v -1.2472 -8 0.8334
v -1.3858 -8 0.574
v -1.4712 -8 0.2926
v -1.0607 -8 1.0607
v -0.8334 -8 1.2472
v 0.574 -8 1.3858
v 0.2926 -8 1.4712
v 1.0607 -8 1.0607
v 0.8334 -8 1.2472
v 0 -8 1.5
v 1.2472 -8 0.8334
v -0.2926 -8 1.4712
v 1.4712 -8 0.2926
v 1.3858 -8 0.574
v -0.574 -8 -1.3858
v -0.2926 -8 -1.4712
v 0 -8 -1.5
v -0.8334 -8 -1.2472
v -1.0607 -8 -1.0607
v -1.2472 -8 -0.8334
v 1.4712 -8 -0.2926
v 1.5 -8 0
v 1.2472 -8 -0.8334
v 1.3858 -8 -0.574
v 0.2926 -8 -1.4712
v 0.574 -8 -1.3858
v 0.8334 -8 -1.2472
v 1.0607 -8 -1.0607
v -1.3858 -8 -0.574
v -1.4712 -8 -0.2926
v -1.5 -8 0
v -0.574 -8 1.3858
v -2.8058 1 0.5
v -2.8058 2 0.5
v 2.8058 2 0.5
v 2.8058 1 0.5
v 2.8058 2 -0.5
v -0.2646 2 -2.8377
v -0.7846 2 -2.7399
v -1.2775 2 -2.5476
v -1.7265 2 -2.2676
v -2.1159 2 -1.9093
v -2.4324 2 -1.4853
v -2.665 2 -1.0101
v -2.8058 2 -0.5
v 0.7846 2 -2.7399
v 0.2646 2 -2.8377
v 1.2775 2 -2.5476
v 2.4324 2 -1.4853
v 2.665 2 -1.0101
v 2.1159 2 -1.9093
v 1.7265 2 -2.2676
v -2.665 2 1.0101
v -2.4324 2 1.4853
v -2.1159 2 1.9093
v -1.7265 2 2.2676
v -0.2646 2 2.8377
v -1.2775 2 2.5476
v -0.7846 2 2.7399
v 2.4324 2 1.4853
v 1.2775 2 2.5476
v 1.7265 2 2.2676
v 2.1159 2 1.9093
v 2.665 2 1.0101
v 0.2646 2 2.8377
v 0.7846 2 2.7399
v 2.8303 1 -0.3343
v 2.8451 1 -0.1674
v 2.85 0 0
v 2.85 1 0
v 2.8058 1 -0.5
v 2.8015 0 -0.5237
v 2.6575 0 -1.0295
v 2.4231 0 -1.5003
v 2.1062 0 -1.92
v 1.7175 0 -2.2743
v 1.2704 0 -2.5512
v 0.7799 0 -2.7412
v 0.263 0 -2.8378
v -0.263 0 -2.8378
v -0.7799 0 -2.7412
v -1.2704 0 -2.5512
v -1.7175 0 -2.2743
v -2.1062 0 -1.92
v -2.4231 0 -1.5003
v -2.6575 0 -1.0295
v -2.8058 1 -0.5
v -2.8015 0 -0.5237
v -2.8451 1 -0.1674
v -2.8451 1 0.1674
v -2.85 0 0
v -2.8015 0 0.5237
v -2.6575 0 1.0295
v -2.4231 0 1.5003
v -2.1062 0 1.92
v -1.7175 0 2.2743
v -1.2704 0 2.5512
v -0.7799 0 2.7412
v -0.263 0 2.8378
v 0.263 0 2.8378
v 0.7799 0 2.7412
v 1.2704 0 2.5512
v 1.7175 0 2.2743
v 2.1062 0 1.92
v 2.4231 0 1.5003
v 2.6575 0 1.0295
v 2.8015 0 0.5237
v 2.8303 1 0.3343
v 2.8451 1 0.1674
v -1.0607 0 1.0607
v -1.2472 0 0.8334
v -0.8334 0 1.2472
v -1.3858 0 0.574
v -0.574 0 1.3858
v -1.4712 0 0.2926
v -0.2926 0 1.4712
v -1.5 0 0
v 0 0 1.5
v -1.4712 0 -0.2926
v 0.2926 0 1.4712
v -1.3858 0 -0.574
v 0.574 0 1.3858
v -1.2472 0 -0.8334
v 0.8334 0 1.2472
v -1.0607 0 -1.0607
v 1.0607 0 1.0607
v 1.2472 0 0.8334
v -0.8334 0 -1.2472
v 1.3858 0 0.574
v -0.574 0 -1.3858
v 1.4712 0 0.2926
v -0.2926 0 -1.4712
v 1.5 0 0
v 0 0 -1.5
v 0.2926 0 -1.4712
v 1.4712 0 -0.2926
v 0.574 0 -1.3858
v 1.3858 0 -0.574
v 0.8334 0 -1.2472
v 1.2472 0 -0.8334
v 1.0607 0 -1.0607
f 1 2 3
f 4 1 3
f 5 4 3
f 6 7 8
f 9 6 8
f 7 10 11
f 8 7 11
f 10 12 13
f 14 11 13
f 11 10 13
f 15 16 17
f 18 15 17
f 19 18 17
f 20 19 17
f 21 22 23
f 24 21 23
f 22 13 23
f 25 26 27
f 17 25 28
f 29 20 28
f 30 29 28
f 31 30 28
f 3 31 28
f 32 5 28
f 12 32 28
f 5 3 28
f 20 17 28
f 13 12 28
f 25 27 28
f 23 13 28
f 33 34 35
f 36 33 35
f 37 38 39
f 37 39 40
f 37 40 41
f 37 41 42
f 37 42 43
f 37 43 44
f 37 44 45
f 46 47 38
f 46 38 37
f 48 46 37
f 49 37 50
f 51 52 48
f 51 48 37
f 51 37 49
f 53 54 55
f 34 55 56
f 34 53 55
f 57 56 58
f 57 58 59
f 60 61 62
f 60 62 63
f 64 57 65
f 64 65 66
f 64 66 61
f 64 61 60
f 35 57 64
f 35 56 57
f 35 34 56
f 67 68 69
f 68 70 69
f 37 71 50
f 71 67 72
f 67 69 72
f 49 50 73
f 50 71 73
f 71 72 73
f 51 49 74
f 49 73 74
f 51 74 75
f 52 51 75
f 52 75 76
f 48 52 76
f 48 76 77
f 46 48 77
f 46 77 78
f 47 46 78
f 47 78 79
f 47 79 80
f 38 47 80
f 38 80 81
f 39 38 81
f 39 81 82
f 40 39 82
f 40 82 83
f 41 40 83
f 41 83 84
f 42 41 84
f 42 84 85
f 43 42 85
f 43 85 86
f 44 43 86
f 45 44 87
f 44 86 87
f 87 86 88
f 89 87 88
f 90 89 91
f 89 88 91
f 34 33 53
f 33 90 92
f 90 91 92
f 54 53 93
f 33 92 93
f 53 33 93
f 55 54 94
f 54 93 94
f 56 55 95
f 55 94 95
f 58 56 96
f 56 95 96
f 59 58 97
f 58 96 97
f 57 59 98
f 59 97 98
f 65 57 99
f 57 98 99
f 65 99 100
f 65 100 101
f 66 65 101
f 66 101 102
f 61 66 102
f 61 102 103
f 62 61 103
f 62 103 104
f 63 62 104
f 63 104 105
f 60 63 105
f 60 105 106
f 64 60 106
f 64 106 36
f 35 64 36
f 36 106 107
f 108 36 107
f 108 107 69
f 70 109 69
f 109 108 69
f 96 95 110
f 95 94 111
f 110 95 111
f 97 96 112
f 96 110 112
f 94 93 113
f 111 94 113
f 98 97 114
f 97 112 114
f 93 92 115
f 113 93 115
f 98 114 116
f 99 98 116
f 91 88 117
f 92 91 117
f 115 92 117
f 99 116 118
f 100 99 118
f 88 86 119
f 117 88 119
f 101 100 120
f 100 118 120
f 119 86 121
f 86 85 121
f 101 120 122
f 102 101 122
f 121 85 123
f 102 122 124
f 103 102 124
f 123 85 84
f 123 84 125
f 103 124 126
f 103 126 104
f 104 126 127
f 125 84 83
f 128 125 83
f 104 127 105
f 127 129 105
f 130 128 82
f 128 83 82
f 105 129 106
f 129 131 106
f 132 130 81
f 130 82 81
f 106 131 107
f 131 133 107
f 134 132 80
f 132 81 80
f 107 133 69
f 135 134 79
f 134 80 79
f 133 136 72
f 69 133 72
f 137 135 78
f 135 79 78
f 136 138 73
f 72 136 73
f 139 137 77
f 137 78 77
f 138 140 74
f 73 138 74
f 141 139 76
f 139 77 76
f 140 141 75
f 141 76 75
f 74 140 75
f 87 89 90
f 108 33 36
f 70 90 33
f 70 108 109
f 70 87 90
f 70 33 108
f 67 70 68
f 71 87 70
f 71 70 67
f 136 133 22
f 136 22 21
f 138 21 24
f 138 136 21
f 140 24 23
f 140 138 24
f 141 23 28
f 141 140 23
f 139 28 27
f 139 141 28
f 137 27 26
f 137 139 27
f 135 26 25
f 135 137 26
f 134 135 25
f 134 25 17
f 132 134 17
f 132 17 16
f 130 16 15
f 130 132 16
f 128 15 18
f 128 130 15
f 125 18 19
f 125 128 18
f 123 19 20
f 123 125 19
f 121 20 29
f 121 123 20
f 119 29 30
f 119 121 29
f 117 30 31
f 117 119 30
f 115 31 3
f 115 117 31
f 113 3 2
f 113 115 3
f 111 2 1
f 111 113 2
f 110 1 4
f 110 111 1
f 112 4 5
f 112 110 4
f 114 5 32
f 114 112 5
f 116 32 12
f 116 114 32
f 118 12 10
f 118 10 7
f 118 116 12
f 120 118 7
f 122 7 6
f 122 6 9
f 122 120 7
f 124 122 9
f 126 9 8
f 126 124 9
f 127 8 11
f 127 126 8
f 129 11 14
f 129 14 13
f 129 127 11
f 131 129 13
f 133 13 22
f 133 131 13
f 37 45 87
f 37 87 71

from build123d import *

# Parameters (mm, degrees)
SKETCH1_R           = 2.85
BOSS_EXTRUDE1_DEPTH = 2
SKETCH2_R           = 1.5
BOSS_EXTRUDE2_DEPTH = 8
SKETCH3_W           = 6
SKETCH3_H           = 1
CUT_EXTRUDE1_DEPTH  = 1


with BuildPart() as part:
    # Sketch1 → Boss-Extrude1 (new body)
    with BuildSketch(Plane(origin=(0, 0, 0), x_dir=(1, 0, 0), z_dir=(0, 1, 0))):
        Circle(SKETCH1_R)
    extrude(amount=BOSS_EXTRUDE1_DEPTH)

    # Sketch2 → Boss-Extrude2 (add)
    with BuildSketch(Plane(origin=(0, 0, 0), x_dir=(1, 0, 0), z_dir=(0, 1, 0))):
        Circle(SKETCH2_R)
    extrude(amount=-BOSS_EXTRUDE2_DEPTH)

    # Sketch3 → Cut-Extrude1 (cut)
    with BuildSketch(Plane(origin=(0, 2, 0), x_dir=(1, 0, 0), z_dir=(0, 1, 0))):
        Rectangle(SKETCH3_W, SKETCH3_H)
    extrude(amount=-CUT_EXTRUDE1_DEPTH, mode=Mode.SUBTRACT)


solid = part.part
